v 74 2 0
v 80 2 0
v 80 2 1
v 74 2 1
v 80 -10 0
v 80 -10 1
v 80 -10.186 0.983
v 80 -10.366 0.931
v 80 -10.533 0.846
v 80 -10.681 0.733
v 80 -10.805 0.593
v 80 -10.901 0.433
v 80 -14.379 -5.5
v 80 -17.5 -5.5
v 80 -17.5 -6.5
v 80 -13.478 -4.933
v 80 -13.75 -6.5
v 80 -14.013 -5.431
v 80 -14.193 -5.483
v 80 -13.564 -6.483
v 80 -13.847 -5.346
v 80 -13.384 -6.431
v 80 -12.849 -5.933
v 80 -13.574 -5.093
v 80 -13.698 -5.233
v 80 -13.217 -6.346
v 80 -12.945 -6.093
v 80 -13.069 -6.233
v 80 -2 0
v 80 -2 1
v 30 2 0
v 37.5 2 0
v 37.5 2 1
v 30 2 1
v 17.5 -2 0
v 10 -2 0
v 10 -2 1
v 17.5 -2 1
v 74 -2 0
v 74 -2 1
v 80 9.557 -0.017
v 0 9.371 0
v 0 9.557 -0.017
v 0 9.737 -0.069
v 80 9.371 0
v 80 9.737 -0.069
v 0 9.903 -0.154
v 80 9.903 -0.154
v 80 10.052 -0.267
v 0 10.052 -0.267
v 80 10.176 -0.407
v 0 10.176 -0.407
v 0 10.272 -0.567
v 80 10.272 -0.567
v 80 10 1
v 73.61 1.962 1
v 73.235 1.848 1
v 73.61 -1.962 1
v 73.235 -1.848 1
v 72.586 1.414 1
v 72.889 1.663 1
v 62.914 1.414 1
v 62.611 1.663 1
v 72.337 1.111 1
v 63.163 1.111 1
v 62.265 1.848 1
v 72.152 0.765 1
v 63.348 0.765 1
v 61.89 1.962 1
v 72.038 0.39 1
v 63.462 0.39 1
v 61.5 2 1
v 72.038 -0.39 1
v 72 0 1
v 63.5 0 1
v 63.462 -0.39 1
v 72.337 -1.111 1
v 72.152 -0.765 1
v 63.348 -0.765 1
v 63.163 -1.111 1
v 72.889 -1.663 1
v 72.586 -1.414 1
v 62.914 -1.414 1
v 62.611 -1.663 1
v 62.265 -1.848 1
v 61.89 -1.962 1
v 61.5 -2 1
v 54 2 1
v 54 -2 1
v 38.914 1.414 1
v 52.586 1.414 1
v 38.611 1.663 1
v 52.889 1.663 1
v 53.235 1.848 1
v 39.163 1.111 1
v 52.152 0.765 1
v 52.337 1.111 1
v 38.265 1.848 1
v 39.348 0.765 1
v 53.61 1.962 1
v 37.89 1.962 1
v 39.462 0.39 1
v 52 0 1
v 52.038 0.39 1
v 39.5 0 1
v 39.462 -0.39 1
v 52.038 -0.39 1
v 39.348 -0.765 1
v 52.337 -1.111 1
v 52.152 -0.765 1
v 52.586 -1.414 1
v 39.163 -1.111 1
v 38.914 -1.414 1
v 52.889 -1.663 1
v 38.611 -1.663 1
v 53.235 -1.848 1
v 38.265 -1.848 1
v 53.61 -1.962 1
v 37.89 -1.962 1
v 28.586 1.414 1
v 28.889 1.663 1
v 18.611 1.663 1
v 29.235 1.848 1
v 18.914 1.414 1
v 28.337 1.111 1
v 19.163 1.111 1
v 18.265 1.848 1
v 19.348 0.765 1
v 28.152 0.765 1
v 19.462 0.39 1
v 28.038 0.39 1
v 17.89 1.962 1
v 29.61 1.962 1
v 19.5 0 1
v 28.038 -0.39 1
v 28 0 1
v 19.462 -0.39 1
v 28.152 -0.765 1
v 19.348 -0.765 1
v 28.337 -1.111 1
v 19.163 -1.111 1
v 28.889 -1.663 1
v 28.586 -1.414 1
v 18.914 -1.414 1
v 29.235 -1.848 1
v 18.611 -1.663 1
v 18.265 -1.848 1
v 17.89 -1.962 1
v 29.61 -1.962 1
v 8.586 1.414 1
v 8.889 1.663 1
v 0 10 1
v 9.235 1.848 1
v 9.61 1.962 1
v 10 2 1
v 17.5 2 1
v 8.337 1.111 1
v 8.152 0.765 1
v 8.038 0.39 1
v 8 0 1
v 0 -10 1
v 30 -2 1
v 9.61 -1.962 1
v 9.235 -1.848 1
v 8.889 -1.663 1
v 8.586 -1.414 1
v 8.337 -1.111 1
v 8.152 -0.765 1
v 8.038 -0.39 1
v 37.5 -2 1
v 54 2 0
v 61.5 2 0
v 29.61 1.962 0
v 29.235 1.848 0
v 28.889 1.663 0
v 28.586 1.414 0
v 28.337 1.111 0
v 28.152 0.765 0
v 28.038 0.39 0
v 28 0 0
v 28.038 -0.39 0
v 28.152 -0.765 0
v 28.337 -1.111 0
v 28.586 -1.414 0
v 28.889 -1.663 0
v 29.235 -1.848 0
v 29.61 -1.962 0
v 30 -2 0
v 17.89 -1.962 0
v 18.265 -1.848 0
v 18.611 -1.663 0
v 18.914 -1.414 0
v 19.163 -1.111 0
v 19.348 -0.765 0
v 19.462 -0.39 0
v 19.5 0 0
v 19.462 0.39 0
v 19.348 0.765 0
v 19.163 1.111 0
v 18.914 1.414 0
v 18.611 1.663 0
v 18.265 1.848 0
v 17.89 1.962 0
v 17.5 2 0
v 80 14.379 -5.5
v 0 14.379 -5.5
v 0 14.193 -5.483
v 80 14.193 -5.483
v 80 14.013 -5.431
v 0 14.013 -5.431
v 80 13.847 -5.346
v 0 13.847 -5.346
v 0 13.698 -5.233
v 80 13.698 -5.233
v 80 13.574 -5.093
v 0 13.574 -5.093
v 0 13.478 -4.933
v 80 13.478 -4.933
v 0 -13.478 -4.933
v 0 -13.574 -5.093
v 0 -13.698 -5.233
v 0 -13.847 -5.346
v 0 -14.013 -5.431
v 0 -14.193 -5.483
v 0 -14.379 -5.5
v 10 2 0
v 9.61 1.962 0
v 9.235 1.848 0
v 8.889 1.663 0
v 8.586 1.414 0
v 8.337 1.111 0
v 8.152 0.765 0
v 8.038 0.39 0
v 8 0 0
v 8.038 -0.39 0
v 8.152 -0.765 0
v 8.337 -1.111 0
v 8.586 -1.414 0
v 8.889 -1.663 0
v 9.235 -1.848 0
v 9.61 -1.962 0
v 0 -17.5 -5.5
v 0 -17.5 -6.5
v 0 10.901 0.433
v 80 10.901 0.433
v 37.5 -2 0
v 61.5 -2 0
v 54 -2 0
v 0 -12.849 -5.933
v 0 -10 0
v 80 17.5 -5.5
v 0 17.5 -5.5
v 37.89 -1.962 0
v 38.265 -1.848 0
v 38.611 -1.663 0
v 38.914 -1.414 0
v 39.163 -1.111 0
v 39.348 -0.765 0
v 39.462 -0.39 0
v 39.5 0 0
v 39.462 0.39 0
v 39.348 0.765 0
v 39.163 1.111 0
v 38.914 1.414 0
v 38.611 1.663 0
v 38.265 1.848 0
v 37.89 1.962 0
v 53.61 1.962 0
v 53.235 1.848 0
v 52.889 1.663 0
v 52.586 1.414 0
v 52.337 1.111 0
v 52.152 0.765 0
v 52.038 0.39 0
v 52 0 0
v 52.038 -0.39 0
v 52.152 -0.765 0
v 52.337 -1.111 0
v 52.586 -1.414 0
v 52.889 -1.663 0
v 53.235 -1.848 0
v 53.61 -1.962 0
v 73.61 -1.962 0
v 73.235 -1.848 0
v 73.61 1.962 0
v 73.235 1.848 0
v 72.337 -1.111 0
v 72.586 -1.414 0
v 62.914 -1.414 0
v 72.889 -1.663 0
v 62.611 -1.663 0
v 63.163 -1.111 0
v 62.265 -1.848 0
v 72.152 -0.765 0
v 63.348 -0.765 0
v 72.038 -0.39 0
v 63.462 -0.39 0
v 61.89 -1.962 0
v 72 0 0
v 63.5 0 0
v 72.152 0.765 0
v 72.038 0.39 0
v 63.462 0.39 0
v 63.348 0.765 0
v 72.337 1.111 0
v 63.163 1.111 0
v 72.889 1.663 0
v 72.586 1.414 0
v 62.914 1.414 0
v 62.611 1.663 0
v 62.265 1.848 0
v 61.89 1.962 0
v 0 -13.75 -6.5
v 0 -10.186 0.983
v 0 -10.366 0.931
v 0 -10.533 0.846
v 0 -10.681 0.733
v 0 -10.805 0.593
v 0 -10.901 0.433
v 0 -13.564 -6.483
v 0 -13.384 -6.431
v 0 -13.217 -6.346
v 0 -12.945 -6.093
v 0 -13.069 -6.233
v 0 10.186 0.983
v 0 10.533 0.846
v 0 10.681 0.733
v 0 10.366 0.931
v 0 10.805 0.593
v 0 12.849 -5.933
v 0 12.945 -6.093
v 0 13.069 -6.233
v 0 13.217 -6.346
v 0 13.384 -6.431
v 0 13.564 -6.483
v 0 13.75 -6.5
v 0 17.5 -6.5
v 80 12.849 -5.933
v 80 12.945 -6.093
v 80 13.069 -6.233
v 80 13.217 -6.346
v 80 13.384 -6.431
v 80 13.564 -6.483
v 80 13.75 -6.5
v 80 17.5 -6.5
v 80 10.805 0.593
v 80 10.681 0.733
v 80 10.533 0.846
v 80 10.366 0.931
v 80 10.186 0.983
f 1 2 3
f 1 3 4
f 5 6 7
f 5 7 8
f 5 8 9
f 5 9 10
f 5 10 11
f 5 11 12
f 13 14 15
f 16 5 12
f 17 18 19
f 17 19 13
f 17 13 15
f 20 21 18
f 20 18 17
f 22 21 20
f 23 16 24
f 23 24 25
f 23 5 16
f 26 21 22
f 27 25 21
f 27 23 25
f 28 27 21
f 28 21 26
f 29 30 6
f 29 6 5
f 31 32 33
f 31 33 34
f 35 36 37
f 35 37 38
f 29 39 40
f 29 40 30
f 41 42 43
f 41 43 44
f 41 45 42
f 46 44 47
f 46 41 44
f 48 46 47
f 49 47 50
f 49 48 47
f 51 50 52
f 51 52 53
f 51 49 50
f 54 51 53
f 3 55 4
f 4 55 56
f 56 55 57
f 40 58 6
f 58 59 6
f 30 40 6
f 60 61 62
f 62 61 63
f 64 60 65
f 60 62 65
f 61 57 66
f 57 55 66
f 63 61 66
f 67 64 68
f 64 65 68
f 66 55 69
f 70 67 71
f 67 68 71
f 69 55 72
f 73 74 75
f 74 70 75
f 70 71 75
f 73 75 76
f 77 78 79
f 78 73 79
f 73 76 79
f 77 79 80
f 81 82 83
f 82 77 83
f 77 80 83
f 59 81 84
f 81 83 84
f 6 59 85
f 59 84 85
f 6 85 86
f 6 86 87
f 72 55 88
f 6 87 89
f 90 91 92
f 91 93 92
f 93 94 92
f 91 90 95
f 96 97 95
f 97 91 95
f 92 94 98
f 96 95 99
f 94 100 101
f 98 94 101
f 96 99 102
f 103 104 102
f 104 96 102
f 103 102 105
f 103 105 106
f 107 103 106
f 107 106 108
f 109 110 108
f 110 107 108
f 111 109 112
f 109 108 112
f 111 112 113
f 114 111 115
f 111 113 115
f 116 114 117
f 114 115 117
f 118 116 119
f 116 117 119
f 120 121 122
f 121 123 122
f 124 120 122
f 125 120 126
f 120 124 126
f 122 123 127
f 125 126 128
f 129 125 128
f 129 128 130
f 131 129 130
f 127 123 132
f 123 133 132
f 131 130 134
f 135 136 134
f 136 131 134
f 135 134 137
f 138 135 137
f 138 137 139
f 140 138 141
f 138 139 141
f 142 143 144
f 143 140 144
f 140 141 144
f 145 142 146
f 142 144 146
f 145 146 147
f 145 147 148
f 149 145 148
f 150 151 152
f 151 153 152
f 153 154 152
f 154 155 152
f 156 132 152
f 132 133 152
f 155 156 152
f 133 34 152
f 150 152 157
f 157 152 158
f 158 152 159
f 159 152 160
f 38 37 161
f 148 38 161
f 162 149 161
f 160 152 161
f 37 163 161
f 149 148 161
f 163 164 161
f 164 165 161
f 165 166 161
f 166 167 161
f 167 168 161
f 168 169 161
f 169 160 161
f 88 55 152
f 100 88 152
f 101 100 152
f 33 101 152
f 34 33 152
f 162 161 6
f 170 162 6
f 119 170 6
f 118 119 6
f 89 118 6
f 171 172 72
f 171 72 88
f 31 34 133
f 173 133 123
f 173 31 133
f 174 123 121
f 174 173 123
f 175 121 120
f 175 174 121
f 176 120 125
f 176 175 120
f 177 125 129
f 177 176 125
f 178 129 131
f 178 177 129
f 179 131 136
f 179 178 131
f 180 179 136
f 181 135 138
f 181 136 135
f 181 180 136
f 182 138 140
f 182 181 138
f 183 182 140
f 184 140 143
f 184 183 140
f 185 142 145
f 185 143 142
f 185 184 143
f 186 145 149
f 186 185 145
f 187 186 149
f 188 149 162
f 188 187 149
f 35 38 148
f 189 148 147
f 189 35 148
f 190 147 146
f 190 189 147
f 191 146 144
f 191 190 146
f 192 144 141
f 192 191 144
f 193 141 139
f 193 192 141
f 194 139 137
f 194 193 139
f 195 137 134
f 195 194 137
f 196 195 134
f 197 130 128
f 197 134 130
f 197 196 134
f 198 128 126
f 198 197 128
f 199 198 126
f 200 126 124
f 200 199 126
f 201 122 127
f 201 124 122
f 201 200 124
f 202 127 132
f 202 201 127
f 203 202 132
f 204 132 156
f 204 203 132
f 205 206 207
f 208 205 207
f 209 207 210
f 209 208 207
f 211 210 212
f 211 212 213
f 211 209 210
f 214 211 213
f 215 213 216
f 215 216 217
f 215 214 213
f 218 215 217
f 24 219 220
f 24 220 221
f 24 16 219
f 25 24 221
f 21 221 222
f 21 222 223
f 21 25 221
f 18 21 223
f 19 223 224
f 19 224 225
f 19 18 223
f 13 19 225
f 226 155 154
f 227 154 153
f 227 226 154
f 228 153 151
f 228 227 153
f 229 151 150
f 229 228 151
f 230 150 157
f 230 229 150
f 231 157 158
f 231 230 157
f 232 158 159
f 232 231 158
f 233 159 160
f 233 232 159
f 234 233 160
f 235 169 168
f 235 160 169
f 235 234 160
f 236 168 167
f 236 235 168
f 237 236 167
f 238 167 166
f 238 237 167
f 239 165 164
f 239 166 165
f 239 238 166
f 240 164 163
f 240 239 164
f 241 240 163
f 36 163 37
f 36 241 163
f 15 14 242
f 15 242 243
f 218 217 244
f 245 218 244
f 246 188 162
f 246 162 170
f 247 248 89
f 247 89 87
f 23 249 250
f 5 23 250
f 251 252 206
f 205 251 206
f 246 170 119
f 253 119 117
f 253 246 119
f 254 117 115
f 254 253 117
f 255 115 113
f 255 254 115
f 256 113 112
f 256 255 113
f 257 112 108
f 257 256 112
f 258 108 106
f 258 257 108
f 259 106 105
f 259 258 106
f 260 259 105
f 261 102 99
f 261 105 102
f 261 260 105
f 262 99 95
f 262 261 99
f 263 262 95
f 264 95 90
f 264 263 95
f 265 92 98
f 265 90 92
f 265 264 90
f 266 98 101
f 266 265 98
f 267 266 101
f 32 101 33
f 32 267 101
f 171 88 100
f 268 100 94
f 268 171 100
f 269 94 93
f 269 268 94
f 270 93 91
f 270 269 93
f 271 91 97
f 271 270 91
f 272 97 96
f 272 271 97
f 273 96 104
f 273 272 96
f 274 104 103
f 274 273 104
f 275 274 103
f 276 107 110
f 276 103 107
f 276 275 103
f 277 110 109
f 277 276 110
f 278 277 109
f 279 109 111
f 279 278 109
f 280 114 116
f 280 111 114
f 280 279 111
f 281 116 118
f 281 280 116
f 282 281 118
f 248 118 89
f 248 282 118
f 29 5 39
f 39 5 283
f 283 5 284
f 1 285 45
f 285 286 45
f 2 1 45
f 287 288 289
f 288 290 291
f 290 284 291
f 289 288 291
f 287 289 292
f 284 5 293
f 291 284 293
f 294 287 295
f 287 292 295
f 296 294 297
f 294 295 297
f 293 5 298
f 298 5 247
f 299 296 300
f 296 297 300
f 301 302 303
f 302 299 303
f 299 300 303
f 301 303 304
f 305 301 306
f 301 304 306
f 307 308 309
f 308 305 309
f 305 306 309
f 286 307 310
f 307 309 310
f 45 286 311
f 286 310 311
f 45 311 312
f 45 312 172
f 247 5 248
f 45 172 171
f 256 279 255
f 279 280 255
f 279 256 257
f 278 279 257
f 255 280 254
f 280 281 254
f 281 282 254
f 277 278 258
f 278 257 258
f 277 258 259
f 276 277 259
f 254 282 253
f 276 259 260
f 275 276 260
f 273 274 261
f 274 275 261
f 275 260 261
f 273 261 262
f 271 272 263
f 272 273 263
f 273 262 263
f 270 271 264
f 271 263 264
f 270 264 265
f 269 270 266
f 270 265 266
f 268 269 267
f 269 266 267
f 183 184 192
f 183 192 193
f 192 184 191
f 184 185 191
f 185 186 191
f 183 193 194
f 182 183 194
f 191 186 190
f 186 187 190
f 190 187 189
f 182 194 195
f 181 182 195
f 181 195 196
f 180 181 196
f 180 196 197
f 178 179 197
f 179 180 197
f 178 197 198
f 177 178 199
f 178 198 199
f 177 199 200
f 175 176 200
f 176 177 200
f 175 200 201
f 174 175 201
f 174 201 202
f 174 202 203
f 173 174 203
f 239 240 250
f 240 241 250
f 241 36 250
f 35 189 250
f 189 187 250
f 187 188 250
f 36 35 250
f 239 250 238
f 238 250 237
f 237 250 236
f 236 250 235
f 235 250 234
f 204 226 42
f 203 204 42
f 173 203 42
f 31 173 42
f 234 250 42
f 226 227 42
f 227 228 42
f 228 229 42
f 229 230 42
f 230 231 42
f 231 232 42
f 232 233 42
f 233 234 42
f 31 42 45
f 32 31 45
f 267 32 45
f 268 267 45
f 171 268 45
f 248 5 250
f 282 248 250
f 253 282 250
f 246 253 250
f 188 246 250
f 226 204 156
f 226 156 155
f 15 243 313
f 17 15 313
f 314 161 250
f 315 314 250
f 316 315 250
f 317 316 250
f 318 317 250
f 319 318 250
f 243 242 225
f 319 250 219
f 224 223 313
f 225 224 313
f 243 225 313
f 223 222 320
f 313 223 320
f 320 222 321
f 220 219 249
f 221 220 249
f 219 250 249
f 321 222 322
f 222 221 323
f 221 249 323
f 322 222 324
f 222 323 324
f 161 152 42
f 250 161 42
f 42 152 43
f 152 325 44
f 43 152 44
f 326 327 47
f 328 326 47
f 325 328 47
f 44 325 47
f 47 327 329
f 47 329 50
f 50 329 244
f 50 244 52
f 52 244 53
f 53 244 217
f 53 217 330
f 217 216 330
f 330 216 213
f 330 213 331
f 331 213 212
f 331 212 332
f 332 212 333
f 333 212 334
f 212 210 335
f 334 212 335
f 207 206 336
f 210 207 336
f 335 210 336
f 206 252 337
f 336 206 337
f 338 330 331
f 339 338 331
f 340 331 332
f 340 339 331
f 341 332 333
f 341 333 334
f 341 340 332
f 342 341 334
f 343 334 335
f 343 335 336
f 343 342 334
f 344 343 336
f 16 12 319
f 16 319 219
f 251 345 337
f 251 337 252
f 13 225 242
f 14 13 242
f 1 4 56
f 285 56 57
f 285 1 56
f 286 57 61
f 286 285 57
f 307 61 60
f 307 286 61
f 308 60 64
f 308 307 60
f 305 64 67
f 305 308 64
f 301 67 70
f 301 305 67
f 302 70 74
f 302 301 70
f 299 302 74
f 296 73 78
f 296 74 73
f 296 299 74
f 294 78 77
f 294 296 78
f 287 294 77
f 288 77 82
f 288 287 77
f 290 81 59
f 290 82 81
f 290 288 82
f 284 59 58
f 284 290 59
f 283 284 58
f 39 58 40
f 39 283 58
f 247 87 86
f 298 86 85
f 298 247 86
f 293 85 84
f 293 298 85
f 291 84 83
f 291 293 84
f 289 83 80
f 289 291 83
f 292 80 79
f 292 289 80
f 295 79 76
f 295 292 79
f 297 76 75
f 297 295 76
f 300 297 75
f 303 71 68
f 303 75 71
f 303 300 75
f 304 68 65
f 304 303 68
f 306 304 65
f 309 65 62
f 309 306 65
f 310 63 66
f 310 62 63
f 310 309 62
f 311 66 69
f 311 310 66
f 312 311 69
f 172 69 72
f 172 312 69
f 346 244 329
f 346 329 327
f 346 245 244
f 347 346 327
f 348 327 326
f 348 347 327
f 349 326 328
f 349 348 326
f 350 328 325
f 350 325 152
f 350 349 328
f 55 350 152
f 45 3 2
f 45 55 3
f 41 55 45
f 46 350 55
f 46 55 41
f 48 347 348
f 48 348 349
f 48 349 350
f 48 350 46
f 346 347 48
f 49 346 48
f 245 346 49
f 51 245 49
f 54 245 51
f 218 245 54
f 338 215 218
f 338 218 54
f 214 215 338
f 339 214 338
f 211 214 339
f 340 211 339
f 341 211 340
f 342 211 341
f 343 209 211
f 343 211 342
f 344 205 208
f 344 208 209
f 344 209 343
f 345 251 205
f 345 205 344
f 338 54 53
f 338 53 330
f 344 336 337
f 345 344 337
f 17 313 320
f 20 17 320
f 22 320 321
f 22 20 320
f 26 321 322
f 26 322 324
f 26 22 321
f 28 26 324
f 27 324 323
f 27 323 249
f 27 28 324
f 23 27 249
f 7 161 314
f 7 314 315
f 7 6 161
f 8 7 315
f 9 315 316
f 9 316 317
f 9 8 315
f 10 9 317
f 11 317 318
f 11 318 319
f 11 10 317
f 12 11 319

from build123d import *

# Parameters (mm, degrees)
EXTRUDE_1_DEPTH     = 80
FILLET_1_R          = 1
CUT_EXTRUDE_1_DEPTH = 10


with BuildPart() as part:
    # 草图1 → 凸台-拉伸1 (new body)
    with BuildSketch(Plane(origin=(0, 0, 0), x_dir=(0, 0, -1), z_dir=(1, 0, 0))):
        Polygon((0, -10), (0, 10), (6.5, 13.120839269), (6.5, 17.5), (5.5, 17.5), (5.5, 13.75), (-1, 10.629160731), (-1, -10.629160731), (5.5, -13.75), (5.5, -17.5), (6.5, -17.5), (6.5, -13.120839269), align=None)
    extrude(amount=EXTRUDE_1_DEPTH)

    # 圆角1
    fillet_1_edges = [part.edges().sort_by_distance(p)[0] for p in [
        (40, 10, 0),
        (40, -13.120839269, -6.5),
        (40, -13.75, -5.5),
        (40, -10.629160731, 1),
        (40, 10.629160731, 1),
        (40, 13.75, -5.5),
        (40, 13.120839269, -6.5),
    ]]
    fillet(fillet_1_edges, radius=FILLET_1_R)

    # 草图2 → 切除-拉伸1 (cut)
    with BuildSketch(Plane(origin=(0, 0, 0), x_dir=(-1, 0, 0), z_dir=(0, 0, -1))):
        with BuildLine():
            Line((-10, -2), (-17.5, -2))
            ThreePointArc((-17.5, -2), (-19.5, 0), (-17.5, 2))
            Line((-17.5, 2), (-10, 2))
            ThreePointArc((-10, 2), (-8, 0), (-10, -2))
        make_face()
        with BuildLine():
            Line((-30, -2), (-37.5, -2))
            ThreePointArc((-37.5, -2), (-39.5, 0), (-37.5, 2))
            Line((-37.5, 2), (-30, 2))
            ThreePointArc((-30, 2), (-28, 0), (-30, -2))
        make_face()
        with BuildLine():
            Line((-54, -2), (-61.5, -2))
            ThreePointArc((-61.5, -2), (-63.5, 0), (-61.5, 2))
            Line((-61.5, 2), (-54, 2))
            ThreePointArc((-54, 2), (-52, 0), (-54, -2))
        make_face()
        with BuildLine():
            Line((-74, -2), (-81.5, -2))
            ThreePointArc((-81.5, -2), (-83.5, 0), (-81.5, 2))
            Line((-81.5, 2), (-74, 2))
            ThreePointArc((-74, 2), (-72, 0), (-74, -2))
        make_face()
        with BuildLine():
            Line((-98, -2), (-105.5, -2))
            ThreePointArc((-105.5, -2), (-107.5, 0), (-105.5, 2))
            Line((-105.5, 2), (-98, 2))
            ThreePointArc((-98, 2), (-96, 0), (-98, -2))
        make_face()
        with BuildLine():
            Line((-118, -2), (-125.5, -2))
            ThreePointArc((-125.5, -2), (-127.5, 0), (-125.5, 2))
            Line((-125.5, 2), (-118, 2))
            ThreePointArc((-118, 2), (-116, 0), (-118, -2))
        make_face()
        with BuildLine():
            Line((-142, -2), (-149.5, -2))
            ThreePointArc((-149.5, -2), (-151.5, 0), (-149.5, 2))
            Line((-149.5, 2), (-142, 2))
            ThreePointArc((-142, 2), (-140, 0), (-142, -2))
        make_face()
        with BuildLine():
            Line((-162, -2), (-169.5, -2))
            ThreePointArc((-169.5, -2), (-171.5, 0), (-169.5, 2))
            Line((-169.5, 2), (-162, 2))
            ThreePointArc((-162, 2), (-160, 0), (-162, -2))
        make_face()
        with BuildLine():
            Line((-186, -2), (-193.5, -2))
            ThreePointArc((-193.5, -2), (-195.5, 0), (-193.5, 2))
            Line((-193.5, 2), (-186, 2))
            ThreePointArc((-186, 2), (-184, 0), (-186, -2))
        make_face()
        with BuildLine():
            Line((-206, -2), (-213.5, -2))
            ThreePointArc((-213.5, -2), (-215.5, 0), (-213.5, 2))
            Line((-213.5, 2), (-206, 2))
            ThreePointArc((-206, 2), (-204, 0), (-206, -2))
        make_face()
        with BuildLine():
            Line((-230, -2), (-237.5, -2))
            ThreePointArc((-237.5, -2), (-239.5, 0), (-237.5, 2))
            Line((-237.5, 2), (-230, 2))
            ThreePointArc((-230, 2), (-228, 0), (-230, -2))
        make_face()
        with BuildLine():
            Line((-250, -2), (-257.5, -2))
            ThreePointArc((-257.5, -2), (-259.5, 0), (-257.5, 2))
            Line((-257.5, 2), (-250, 2))
            ThreePointArc((-250, 2), (-248, 0), (-250, -2))
        make_face()
        with BuildLine():
            Line((-274, -2), (-281.5, -2))
            ThreePointArc((-281.5, -2), (-283.5, 0), (-281.5, 2))
            Line((-281.5, 2), (-274, 2))
            ThreePointArc((-274, 2), (-272, 0), (-274, -2))
        make_face()
        with BuildLine():
            Line((-294, -2), (-301.5, -2))
            ThreePointArc((-301.5, -2), (-303.5, 0), (-301.5, 2))
            Line((-301.5, 2), (-294, 2))
            ThreePointArc((-294, 2), (-292, 0), (-294, -2))
        make_face()
        with BuildLine():
            Line((-318, -2), (-325.5, -2))
            ThreePointArc((-325.5, -2), (-327.5, 0), (-325.5, 2))
            Line((-325.5, 2), (-318, 2))
            ThreePointArc((-318, 2), (-316, 0), (-318, -2))
        make_face()
        with BuildLine():
            Line((-338, -2), (-345.5, -2))
            ThreePointArc((-345.5, -2), (-347.5, 0), (-345.5, 2))
            Line((-345.5, 2), (-338, 2))
            ThreePointArc((-338, 2), (-336, 0), (-338, -2))
        make_face()
        with BuildLine():
            Line((-362, -2), (-369.5, -2))
            ThreePointArc((-369.5, -2), (-371.5, 0), (-369.5, 2))
            Line((-369.5, 2), (-362, 2))
            ThreePointArc((-362, 2), (-360, 0), (-362, -2))
        make_face()
        with BuildLine():
            Line((-382, -2), (-389.5, -2))
            ThreePointArc((-389.5, -2), (-391.5, 0), (-389.5, 2))
            Line((-389.5, 2), (-382, 2))
            ThreePointArc((-382, 2), (-380, 0), (-382, -2))
        make_face()
    extrude(amount=-CUT_EXTRUDE_1_DEPTH, mode=Mode.SUBTRACT)


solid = part.part
